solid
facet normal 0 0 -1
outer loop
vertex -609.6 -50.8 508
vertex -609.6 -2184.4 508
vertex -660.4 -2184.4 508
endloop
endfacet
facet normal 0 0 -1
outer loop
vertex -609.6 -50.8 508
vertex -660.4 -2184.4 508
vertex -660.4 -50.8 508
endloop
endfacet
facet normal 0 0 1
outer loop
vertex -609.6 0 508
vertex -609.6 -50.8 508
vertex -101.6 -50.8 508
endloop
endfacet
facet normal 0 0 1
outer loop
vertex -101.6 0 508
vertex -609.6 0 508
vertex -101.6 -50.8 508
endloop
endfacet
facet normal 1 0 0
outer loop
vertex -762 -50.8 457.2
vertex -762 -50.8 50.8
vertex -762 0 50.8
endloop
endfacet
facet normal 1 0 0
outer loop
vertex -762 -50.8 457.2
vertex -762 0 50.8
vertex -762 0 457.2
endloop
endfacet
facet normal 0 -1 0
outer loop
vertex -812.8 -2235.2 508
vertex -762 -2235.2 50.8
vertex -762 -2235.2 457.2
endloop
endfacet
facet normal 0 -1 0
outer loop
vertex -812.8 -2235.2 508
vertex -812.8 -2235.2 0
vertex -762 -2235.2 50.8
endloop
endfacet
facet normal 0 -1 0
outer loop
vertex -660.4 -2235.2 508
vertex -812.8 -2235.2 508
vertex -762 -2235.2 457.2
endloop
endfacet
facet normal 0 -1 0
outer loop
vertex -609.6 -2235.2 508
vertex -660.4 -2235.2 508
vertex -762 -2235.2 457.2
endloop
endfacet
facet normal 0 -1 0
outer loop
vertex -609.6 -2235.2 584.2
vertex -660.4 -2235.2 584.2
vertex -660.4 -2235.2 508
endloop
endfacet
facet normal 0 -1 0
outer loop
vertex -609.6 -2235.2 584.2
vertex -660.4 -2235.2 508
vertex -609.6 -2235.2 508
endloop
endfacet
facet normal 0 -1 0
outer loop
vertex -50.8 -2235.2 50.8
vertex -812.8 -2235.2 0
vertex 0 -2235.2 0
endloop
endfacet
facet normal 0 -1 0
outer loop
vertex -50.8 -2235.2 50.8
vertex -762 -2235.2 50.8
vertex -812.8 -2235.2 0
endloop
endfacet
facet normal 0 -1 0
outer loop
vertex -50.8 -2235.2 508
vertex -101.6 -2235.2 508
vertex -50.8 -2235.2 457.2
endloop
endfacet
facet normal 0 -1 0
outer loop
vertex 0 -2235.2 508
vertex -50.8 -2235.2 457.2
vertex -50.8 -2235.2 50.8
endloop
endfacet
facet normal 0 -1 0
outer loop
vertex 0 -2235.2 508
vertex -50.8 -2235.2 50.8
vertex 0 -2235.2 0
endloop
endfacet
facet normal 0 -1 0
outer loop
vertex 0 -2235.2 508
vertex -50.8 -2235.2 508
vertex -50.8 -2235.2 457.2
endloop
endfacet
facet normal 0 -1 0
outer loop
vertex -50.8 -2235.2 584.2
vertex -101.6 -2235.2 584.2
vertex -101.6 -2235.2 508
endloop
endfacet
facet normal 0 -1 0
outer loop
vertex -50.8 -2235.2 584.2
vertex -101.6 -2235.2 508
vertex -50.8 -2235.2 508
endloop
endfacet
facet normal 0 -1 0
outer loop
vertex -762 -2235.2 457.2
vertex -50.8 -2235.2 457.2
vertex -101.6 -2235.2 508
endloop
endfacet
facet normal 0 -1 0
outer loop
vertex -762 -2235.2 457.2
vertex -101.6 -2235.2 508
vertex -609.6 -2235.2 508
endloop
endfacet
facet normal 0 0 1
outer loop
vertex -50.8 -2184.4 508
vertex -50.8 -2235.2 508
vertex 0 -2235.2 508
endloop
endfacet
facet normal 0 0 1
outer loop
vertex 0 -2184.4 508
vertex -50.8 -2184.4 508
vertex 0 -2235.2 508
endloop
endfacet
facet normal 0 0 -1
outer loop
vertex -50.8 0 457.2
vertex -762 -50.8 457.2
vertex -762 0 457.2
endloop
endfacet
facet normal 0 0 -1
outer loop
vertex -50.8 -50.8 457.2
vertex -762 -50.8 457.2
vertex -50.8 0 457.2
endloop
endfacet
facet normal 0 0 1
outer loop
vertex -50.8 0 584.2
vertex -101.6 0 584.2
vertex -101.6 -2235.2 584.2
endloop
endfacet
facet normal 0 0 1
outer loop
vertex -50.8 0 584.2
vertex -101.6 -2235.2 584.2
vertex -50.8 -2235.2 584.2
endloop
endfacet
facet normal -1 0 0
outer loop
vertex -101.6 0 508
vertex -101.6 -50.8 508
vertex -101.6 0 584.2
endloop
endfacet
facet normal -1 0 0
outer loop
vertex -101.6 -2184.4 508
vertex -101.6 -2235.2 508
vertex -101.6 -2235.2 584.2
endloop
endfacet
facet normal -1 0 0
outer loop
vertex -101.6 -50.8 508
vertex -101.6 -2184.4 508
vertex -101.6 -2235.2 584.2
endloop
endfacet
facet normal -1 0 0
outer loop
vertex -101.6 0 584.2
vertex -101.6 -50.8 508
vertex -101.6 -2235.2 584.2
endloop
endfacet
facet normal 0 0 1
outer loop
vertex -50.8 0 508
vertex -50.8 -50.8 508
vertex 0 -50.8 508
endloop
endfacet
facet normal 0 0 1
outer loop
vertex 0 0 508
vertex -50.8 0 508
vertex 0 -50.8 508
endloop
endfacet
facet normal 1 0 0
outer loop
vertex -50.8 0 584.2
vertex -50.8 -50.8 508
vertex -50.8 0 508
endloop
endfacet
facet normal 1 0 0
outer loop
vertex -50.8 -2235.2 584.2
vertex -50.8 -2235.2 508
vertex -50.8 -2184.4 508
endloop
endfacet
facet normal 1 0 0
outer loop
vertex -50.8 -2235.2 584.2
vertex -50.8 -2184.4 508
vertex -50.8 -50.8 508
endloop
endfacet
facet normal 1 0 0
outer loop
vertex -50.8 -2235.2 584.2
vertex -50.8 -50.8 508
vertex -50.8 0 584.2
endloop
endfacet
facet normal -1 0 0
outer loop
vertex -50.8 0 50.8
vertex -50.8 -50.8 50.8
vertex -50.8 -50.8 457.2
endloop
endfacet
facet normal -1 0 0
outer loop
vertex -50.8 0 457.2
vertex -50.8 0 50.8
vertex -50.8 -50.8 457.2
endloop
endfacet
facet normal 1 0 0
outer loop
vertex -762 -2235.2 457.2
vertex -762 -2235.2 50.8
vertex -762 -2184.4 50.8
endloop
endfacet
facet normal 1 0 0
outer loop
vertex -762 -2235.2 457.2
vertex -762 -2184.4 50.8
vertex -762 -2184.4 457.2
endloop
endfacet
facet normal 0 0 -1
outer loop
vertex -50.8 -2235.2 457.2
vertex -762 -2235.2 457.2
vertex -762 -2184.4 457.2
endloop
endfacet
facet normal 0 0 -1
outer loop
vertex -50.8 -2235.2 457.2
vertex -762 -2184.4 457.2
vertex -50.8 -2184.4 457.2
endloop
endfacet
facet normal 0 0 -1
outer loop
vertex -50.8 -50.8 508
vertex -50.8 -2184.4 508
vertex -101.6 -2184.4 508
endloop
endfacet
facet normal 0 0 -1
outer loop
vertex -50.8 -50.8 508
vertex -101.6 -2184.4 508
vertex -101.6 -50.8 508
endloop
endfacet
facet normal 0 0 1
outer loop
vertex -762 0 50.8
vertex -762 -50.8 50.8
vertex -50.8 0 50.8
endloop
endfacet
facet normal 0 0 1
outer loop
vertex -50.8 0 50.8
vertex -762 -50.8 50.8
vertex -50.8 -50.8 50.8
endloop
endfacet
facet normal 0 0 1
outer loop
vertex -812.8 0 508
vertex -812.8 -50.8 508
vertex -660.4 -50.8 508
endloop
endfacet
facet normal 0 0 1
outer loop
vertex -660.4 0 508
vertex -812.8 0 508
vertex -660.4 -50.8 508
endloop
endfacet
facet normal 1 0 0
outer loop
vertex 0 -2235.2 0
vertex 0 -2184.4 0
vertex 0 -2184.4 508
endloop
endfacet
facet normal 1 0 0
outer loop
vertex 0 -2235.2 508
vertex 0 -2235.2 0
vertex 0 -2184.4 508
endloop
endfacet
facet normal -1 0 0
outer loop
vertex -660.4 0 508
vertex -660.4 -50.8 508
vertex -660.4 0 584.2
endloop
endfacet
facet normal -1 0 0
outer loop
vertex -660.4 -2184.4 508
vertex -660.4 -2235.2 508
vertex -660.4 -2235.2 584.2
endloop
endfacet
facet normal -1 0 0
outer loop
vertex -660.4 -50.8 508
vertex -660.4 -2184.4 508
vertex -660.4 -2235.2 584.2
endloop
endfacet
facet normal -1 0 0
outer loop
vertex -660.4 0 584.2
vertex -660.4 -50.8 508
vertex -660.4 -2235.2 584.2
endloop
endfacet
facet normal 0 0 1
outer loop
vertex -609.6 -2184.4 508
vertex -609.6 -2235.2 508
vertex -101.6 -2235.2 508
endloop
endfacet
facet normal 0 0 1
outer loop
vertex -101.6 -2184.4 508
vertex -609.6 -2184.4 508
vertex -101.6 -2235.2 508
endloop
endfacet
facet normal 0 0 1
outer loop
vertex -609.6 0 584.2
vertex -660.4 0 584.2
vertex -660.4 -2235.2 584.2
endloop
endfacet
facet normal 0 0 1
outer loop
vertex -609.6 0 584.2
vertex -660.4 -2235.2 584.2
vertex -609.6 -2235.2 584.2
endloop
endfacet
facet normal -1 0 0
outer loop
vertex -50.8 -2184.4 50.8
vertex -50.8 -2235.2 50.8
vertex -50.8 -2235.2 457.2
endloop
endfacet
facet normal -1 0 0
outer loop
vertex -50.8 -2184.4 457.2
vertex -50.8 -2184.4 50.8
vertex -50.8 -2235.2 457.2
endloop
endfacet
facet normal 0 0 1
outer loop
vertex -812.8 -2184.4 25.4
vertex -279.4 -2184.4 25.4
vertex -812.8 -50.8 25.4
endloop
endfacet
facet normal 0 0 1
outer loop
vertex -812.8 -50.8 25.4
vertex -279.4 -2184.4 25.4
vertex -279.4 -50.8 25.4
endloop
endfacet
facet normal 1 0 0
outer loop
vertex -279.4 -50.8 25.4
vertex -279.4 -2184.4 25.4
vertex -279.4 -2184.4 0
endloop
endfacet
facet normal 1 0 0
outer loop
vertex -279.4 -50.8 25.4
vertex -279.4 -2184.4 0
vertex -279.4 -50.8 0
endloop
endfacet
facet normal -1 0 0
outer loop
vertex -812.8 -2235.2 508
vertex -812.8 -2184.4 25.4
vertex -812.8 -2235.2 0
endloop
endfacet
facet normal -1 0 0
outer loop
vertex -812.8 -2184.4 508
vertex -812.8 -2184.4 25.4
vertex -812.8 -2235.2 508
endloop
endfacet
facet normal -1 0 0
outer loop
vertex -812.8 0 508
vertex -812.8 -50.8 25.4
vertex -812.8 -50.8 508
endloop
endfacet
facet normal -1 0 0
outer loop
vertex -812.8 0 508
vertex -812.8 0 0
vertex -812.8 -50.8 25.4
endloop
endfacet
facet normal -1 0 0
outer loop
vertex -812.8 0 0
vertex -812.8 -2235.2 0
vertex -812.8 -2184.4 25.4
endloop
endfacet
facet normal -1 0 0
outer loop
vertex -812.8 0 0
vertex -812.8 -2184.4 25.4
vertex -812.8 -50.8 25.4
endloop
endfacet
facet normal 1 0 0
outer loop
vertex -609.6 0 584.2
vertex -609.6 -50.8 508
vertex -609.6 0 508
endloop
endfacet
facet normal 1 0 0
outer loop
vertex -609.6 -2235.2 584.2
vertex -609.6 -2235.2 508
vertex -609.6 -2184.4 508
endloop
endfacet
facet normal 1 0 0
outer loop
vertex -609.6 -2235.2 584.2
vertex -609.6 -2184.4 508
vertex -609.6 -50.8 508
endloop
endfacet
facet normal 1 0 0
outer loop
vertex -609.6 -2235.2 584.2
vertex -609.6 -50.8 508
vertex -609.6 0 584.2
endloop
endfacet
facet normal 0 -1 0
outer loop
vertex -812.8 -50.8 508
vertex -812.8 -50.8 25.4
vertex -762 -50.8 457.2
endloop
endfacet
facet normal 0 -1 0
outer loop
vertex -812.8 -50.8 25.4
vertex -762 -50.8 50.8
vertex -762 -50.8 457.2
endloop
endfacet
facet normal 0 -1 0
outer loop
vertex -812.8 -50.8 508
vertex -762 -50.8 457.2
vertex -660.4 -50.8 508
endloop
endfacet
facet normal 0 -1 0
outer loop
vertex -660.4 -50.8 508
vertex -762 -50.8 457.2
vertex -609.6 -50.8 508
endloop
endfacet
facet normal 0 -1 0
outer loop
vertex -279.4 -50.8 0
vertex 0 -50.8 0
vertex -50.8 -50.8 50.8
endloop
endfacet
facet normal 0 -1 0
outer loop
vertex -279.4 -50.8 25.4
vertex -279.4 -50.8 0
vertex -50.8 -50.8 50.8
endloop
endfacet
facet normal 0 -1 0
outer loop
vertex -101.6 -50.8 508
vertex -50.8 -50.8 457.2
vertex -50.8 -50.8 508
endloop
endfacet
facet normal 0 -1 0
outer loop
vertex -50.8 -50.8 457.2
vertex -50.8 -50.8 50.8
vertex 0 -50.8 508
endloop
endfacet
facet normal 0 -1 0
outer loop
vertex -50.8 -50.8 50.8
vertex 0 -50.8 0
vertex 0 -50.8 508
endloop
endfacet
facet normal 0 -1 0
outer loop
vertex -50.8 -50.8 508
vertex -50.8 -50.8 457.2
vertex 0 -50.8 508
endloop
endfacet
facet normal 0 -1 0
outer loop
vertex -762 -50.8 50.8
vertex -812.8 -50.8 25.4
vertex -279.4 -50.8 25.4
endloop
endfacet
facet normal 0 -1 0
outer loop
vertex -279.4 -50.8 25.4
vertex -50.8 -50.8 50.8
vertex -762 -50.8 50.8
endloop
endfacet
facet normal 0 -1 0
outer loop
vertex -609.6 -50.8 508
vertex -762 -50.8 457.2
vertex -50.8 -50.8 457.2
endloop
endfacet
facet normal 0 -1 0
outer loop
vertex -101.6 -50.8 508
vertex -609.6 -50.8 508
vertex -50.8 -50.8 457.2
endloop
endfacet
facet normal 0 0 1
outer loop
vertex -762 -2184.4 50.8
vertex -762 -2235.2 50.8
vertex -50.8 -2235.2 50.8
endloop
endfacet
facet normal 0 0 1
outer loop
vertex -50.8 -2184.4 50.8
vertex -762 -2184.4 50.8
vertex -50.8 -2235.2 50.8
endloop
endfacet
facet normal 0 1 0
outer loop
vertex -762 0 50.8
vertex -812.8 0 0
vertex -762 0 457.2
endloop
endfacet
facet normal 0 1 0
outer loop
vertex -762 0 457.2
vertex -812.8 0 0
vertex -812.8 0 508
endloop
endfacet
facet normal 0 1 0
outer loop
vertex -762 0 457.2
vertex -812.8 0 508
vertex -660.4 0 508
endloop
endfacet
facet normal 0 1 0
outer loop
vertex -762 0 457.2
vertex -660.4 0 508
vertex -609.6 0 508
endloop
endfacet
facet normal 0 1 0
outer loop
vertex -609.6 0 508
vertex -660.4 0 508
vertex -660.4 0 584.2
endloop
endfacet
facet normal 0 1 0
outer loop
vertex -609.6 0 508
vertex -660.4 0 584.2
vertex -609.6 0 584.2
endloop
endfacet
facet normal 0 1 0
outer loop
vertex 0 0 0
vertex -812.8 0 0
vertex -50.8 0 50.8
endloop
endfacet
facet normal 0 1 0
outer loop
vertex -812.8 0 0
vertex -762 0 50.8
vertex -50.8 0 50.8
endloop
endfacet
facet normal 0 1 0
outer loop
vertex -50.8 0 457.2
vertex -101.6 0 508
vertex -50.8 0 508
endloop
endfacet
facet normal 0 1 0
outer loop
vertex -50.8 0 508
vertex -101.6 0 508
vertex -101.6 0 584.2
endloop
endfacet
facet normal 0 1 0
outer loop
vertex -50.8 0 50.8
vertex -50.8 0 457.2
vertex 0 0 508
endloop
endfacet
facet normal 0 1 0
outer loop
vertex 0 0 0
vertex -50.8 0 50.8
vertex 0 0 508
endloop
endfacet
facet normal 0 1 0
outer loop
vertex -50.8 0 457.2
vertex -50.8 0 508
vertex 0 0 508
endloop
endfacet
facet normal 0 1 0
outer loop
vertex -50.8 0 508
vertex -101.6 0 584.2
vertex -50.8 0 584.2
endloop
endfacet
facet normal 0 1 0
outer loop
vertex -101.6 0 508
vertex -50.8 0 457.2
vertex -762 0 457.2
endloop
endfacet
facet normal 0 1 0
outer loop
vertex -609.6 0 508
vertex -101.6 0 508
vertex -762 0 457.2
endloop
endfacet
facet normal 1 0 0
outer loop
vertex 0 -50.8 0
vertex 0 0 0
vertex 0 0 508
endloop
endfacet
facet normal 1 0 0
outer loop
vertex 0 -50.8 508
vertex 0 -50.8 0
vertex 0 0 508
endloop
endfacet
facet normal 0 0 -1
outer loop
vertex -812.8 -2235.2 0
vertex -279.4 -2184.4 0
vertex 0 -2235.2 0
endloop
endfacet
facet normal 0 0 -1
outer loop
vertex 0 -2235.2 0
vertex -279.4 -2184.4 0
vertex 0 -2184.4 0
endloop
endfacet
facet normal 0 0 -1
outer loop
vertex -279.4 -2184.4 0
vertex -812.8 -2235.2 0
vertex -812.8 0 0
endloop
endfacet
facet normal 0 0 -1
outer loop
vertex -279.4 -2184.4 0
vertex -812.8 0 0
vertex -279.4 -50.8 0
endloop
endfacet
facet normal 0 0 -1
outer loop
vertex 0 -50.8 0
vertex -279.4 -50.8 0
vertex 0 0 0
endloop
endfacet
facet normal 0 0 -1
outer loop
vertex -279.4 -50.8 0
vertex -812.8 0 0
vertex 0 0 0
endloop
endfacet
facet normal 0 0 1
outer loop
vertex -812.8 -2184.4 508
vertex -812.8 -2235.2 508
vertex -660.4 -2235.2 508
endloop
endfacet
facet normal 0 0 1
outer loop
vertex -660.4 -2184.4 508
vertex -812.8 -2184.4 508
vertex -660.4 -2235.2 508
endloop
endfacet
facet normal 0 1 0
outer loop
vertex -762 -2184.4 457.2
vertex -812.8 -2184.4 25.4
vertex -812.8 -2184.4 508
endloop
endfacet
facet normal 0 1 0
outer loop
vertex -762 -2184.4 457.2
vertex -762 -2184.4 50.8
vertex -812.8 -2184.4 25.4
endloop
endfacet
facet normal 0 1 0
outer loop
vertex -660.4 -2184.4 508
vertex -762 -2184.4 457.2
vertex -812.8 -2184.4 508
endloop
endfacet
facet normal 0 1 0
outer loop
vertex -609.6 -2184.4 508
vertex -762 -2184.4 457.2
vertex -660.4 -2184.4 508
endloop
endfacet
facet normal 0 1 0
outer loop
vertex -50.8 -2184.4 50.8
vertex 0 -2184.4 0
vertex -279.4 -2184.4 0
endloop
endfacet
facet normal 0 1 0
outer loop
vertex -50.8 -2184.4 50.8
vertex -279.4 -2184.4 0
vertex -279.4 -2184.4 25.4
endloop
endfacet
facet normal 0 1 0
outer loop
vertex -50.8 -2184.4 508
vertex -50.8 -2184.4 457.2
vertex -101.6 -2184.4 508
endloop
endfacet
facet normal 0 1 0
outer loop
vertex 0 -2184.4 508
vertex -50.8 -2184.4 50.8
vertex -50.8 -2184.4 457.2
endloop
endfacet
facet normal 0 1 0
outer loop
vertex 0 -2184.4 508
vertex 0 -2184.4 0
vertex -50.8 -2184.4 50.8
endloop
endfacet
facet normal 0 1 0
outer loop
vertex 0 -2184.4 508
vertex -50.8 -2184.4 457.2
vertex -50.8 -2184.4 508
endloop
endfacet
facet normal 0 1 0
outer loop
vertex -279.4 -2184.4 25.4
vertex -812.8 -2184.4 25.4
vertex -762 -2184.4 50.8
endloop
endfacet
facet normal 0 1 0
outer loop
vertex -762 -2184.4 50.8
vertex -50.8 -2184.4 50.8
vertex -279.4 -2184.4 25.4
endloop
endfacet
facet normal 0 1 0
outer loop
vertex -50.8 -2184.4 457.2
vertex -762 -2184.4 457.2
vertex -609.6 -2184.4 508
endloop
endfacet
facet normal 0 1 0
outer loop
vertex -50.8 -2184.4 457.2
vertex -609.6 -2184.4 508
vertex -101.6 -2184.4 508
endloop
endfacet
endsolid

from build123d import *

# Parameters (mm, degrees)
F0_W     = 812.8
F0_H     = 584.2
F1_DEPTH = 2235.2
F2_W     = 152.4
F2_H     = 76.2
F2_W_2   = 508
F2_W_3   = 50.8
F3_DEPTH = 2235.201
F4_W     = 711.2
F4_H     = 406.4
F5_DEPTH = 2235.201
F6_W     = 2133.6
F6_H     = 482.6
F7_DEPTH = 812.801
F8_W     = 279.4
F8_H     = 2133.6
F9_DEPTH = 25.4


with BuildPart() as f1:
    # F0 (on Front) → F1 (new body)
    with BuildSketch(Plane.XZ):
        with Locations((-406.4, 292.1)):
            Rectangle(F0_W, F0_H)
    extrude(amount=F1_DEPTH)

    # F2 (on face) → F3 (cut, through all)
    with BuildSketch(Plane.XZ.offset(2235.2)):
        with Locations((-736.6, 546.1)):
            Rectangle(F2_W, F2_H)
        with Locations((-355.6, 546.1)):
            Rectangle(F2_W_2, F2_H)
        with Locations((-25.4, 546.1)):
            Rectangle(F2_W_3, F2_H)
    extrude(amount=-F3_DEPTH, mode=Mode.SUBTRACT)

    # F4 (on face) → F5 (cut, through all)
    with BuildSketch(Plane.XZ.offset(2235.2)):
        with Locations((-406.4, 254)):
            Rectangle(F4_W, F4_H)
    extrude(amount=-F5_DEPTH, mode=Mode.SUBTRACT)

    # F6 (on face) → F7 (cut, through all)
    with BuildSketch(Plane.YZ):
        with Locations((-1117.6, 266.7)):
            Rectangle(F6_W, F6_H)
    extrude(amount=-F7_DEPTH, mode=Mode.SUBTRACT)

    # F8 (on face) → F9 (cut)
    with BuildSketch(Plane.XY.offset(25.4)):
        with Locations((-139.7, -1117.6)):
            Rectangle(F8_W, F8_H)
    extrude(amount=-F9_DEPTH, mode=Mode.SUBTRACT)


solid = f1.part
